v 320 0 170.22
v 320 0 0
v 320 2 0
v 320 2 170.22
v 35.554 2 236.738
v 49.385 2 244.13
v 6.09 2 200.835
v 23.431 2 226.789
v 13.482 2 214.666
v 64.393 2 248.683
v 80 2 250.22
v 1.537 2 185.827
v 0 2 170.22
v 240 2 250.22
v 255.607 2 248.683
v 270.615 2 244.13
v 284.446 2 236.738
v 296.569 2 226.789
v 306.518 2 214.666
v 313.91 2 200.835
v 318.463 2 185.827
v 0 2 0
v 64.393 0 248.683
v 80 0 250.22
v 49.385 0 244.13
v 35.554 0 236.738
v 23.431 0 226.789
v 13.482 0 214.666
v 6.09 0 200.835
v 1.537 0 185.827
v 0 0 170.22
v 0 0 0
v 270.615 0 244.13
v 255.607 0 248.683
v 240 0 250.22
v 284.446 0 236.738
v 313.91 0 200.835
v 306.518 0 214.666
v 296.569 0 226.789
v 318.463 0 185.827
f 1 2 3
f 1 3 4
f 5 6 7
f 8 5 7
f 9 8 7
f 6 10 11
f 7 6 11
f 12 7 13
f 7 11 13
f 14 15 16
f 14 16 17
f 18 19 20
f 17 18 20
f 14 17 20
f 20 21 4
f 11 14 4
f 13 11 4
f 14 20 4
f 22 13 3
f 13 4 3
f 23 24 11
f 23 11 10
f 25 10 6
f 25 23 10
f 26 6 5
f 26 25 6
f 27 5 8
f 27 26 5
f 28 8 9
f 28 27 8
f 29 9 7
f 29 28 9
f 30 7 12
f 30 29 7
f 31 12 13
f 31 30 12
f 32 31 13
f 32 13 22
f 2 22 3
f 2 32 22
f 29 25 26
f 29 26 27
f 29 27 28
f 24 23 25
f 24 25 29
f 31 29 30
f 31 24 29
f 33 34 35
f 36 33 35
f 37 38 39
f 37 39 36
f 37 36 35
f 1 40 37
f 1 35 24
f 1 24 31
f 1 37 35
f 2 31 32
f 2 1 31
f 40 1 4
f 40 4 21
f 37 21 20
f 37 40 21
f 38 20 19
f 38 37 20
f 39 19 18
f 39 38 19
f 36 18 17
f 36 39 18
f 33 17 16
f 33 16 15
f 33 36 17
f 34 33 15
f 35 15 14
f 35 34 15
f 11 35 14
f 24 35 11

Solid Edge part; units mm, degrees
sketch "Sketch1" plane through (0, 0, 0) normal (0, -1, 0) x (1, 0, 0)
  line L0 (240, 250.22) -> (80, 250.22)
  arc A0 (80, 250.22) -> (0, 170.22) centre (80, 170.22) ccw
  line L1 (0, 170.22) -> (0, 0)
  line L2 (0, 0) -> (320, 0)
  line L3 (320, 0) -> (320, 170.22)
  arc A1 (320, 170.22) -> (240, 250.22) centre (240, 170.22) ccw
extrude "Protrusion1" add sketch "Sketch1" against normal blind 2
properties material "Aluminum, 1060"
